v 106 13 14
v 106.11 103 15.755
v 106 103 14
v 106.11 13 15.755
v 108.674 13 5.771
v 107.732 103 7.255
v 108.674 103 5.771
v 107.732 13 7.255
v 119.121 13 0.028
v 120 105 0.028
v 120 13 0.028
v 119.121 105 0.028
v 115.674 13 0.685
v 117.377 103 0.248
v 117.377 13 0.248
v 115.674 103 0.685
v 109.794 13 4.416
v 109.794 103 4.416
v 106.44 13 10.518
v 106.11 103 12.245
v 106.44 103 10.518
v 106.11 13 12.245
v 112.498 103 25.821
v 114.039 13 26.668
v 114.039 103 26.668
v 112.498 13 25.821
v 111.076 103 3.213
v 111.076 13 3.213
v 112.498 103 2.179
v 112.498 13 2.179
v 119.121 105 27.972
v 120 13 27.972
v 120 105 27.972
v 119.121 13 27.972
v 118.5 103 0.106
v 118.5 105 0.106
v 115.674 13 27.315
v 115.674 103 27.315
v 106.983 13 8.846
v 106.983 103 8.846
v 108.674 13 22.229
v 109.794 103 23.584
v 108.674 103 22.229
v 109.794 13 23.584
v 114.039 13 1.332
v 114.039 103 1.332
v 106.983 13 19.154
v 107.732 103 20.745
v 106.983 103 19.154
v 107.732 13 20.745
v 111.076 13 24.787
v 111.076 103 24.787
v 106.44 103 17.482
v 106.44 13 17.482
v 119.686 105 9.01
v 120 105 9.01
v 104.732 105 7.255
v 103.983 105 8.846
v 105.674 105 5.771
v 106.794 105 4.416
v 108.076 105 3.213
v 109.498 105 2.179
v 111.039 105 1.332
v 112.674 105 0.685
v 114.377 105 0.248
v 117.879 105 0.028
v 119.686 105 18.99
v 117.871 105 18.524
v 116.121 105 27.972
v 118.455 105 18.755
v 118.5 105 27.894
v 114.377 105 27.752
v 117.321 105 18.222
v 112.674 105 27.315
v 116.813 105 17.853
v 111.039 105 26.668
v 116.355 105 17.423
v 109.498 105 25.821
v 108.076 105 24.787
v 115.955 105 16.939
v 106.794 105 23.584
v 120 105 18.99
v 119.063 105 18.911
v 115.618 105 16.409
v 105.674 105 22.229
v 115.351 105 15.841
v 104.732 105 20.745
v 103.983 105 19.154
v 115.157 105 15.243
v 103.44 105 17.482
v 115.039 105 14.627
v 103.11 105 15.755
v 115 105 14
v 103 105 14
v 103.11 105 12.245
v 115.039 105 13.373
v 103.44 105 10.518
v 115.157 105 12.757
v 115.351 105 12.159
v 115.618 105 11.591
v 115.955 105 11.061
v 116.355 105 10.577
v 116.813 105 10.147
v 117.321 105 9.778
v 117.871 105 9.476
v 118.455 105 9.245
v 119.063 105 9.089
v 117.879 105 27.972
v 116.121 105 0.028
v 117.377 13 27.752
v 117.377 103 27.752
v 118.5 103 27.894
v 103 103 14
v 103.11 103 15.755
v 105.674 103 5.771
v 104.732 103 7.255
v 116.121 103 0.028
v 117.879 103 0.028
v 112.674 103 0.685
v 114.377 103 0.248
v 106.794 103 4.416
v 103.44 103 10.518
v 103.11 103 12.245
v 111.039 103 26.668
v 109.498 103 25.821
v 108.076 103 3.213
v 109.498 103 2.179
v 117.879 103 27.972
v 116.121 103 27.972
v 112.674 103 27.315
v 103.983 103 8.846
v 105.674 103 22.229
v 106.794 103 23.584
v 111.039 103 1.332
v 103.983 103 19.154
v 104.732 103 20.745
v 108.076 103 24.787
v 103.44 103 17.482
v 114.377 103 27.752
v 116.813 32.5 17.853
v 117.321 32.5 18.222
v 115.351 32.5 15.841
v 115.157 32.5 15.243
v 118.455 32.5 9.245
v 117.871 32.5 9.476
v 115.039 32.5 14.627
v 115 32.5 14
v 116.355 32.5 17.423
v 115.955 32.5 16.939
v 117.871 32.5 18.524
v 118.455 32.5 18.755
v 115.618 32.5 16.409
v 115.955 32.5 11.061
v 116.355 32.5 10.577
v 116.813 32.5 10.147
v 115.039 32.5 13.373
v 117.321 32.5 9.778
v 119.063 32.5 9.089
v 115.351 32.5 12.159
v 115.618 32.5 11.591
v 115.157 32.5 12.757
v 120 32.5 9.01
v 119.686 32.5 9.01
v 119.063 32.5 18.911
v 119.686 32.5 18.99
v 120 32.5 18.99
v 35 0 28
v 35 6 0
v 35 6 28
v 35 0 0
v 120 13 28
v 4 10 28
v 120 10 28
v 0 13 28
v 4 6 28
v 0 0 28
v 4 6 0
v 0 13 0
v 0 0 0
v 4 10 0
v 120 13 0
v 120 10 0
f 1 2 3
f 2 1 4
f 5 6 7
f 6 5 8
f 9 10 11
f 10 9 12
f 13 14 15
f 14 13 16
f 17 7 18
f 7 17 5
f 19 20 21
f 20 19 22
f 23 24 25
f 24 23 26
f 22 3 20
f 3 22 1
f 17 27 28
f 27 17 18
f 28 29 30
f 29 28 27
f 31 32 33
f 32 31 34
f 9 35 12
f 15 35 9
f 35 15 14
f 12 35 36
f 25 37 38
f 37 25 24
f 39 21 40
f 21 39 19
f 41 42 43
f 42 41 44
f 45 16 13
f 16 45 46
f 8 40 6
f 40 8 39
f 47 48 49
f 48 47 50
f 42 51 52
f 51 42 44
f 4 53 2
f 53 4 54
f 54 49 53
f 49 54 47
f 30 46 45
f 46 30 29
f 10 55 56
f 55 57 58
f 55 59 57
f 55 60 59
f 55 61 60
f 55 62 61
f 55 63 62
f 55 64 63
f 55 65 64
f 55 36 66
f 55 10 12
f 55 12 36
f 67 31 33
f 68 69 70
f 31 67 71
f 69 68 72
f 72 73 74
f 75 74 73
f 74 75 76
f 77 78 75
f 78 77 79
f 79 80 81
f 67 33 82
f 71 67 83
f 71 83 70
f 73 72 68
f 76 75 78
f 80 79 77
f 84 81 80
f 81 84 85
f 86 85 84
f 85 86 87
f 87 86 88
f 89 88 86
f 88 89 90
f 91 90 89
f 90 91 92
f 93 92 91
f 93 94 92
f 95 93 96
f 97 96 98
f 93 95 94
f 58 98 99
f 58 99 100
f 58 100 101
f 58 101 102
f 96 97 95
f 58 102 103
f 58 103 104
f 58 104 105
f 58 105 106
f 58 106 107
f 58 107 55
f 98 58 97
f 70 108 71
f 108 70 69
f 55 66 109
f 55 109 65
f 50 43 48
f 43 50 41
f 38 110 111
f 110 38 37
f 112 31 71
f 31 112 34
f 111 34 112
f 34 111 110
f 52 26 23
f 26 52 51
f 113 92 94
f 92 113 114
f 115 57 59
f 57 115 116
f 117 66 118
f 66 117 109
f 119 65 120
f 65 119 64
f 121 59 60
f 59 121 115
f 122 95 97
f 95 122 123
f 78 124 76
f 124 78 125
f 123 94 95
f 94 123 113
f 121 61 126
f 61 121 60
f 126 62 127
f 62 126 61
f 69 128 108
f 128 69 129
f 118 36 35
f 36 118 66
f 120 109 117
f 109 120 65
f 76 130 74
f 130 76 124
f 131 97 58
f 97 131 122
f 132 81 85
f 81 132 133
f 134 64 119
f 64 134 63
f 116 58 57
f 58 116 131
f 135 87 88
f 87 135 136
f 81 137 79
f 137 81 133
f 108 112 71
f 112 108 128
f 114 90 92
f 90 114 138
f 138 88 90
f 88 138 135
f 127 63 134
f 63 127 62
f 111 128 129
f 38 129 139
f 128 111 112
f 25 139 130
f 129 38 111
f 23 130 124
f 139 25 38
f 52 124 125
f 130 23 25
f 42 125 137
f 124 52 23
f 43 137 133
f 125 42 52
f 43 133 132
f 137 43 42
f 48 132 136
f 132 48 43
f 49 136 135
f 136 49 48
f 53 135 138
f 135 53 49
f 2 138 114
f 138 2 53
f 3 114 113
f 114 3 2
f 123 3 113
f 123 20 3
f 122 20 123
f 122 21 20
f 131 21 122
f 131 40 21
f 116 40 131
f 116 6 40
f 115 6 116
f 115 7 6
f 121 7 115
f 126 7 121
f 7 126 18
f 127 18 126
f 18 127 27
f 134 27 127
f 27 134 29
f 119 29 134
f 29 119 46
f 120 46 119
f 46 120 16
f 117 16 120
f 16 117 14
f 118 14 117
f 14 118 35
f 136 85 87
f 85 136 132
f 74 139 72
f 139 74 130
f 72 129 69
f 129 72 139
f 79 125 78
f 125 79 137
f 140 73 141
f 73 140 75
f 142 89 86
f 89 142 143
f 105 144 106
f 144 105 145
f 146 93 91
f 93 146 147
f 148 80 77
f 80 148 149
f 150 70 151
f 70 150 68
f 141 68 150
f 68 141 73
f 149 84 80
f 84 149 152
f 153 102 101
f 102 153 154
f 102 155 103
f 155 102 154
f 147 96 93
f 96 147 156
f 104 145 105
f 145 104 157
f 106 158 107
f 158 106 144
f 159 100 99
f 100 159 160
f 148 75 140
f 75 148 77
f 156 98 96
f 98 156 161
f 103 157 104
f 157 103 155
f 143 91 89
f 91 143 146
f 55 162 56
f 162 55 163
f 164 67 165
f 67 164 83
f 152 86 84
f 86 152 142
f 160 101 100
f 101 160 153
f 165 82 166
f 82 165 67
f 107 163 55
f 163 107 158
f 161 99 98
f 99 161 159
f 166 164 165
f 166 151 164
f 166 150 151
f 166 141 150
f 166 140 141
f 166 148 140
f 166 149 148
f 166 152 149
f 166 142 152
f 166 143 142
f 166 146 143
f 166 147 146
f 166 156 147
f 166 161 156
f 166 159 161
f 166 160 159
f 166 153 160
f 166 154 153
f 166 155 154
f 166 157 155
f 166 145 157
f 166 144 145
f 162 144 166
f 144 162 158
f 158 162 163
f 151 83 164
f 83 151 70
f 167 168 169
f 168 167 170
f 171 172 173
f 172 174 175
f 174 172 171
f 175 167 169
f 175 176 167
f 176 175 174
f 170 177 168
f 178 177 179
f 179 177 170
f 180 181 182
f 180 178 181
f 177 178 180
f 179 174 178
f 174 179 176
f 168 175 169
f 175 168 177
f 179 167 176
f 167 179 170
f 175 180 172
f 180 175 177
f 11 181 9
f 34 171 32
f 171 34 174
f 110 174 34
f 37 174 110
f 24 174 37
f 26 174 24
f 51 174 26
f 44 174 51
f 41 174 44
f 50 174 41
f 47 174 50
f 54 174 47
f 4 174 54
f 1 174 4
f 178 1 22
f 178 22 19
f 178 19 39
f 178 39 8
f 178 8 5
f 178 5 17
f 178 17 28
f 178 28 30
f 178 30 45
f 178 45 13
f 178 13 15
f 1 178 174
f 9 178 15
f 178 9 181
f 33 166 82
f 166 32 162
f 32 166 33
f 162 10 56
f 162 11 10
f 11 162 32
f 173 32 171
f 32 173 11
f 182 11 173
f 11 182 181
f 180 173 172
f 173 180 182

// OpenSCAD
// diameter of the rod
d=28;
// length of the rod
l=90;
// height of the rod
height=120; // [35:350]

difference() {
	union() {
		cube([35,6,d]);
		cube([4,13,d]);
		translate([0,10,0]) {
			cube([height,3,d]);
		}
		difference() {
			union() {
				translate([height,12,d/2]) {
					rotate([-90,0,0]) {
						cylinder(r=d/2, h=l+1+2, $fn=50);
					}
				}
				translate([height-3,12+1+l,d/2]) {
					rotate([-90,0,0]) {
						cylinder(r=d/2, h=2, $fn=50);
					}
				}
			}
			translate([height,10+l/4,d/2]) {
				rotate([-90,0,0]) {
					cylinder(r=d/2-9, h=l+1+2+10, $fn=50);
				}
			}
		}
	}
	translate([height,0,-1]) {
		cube([d/2+1,l+12+1+2+1,d+2]);
	}
}
